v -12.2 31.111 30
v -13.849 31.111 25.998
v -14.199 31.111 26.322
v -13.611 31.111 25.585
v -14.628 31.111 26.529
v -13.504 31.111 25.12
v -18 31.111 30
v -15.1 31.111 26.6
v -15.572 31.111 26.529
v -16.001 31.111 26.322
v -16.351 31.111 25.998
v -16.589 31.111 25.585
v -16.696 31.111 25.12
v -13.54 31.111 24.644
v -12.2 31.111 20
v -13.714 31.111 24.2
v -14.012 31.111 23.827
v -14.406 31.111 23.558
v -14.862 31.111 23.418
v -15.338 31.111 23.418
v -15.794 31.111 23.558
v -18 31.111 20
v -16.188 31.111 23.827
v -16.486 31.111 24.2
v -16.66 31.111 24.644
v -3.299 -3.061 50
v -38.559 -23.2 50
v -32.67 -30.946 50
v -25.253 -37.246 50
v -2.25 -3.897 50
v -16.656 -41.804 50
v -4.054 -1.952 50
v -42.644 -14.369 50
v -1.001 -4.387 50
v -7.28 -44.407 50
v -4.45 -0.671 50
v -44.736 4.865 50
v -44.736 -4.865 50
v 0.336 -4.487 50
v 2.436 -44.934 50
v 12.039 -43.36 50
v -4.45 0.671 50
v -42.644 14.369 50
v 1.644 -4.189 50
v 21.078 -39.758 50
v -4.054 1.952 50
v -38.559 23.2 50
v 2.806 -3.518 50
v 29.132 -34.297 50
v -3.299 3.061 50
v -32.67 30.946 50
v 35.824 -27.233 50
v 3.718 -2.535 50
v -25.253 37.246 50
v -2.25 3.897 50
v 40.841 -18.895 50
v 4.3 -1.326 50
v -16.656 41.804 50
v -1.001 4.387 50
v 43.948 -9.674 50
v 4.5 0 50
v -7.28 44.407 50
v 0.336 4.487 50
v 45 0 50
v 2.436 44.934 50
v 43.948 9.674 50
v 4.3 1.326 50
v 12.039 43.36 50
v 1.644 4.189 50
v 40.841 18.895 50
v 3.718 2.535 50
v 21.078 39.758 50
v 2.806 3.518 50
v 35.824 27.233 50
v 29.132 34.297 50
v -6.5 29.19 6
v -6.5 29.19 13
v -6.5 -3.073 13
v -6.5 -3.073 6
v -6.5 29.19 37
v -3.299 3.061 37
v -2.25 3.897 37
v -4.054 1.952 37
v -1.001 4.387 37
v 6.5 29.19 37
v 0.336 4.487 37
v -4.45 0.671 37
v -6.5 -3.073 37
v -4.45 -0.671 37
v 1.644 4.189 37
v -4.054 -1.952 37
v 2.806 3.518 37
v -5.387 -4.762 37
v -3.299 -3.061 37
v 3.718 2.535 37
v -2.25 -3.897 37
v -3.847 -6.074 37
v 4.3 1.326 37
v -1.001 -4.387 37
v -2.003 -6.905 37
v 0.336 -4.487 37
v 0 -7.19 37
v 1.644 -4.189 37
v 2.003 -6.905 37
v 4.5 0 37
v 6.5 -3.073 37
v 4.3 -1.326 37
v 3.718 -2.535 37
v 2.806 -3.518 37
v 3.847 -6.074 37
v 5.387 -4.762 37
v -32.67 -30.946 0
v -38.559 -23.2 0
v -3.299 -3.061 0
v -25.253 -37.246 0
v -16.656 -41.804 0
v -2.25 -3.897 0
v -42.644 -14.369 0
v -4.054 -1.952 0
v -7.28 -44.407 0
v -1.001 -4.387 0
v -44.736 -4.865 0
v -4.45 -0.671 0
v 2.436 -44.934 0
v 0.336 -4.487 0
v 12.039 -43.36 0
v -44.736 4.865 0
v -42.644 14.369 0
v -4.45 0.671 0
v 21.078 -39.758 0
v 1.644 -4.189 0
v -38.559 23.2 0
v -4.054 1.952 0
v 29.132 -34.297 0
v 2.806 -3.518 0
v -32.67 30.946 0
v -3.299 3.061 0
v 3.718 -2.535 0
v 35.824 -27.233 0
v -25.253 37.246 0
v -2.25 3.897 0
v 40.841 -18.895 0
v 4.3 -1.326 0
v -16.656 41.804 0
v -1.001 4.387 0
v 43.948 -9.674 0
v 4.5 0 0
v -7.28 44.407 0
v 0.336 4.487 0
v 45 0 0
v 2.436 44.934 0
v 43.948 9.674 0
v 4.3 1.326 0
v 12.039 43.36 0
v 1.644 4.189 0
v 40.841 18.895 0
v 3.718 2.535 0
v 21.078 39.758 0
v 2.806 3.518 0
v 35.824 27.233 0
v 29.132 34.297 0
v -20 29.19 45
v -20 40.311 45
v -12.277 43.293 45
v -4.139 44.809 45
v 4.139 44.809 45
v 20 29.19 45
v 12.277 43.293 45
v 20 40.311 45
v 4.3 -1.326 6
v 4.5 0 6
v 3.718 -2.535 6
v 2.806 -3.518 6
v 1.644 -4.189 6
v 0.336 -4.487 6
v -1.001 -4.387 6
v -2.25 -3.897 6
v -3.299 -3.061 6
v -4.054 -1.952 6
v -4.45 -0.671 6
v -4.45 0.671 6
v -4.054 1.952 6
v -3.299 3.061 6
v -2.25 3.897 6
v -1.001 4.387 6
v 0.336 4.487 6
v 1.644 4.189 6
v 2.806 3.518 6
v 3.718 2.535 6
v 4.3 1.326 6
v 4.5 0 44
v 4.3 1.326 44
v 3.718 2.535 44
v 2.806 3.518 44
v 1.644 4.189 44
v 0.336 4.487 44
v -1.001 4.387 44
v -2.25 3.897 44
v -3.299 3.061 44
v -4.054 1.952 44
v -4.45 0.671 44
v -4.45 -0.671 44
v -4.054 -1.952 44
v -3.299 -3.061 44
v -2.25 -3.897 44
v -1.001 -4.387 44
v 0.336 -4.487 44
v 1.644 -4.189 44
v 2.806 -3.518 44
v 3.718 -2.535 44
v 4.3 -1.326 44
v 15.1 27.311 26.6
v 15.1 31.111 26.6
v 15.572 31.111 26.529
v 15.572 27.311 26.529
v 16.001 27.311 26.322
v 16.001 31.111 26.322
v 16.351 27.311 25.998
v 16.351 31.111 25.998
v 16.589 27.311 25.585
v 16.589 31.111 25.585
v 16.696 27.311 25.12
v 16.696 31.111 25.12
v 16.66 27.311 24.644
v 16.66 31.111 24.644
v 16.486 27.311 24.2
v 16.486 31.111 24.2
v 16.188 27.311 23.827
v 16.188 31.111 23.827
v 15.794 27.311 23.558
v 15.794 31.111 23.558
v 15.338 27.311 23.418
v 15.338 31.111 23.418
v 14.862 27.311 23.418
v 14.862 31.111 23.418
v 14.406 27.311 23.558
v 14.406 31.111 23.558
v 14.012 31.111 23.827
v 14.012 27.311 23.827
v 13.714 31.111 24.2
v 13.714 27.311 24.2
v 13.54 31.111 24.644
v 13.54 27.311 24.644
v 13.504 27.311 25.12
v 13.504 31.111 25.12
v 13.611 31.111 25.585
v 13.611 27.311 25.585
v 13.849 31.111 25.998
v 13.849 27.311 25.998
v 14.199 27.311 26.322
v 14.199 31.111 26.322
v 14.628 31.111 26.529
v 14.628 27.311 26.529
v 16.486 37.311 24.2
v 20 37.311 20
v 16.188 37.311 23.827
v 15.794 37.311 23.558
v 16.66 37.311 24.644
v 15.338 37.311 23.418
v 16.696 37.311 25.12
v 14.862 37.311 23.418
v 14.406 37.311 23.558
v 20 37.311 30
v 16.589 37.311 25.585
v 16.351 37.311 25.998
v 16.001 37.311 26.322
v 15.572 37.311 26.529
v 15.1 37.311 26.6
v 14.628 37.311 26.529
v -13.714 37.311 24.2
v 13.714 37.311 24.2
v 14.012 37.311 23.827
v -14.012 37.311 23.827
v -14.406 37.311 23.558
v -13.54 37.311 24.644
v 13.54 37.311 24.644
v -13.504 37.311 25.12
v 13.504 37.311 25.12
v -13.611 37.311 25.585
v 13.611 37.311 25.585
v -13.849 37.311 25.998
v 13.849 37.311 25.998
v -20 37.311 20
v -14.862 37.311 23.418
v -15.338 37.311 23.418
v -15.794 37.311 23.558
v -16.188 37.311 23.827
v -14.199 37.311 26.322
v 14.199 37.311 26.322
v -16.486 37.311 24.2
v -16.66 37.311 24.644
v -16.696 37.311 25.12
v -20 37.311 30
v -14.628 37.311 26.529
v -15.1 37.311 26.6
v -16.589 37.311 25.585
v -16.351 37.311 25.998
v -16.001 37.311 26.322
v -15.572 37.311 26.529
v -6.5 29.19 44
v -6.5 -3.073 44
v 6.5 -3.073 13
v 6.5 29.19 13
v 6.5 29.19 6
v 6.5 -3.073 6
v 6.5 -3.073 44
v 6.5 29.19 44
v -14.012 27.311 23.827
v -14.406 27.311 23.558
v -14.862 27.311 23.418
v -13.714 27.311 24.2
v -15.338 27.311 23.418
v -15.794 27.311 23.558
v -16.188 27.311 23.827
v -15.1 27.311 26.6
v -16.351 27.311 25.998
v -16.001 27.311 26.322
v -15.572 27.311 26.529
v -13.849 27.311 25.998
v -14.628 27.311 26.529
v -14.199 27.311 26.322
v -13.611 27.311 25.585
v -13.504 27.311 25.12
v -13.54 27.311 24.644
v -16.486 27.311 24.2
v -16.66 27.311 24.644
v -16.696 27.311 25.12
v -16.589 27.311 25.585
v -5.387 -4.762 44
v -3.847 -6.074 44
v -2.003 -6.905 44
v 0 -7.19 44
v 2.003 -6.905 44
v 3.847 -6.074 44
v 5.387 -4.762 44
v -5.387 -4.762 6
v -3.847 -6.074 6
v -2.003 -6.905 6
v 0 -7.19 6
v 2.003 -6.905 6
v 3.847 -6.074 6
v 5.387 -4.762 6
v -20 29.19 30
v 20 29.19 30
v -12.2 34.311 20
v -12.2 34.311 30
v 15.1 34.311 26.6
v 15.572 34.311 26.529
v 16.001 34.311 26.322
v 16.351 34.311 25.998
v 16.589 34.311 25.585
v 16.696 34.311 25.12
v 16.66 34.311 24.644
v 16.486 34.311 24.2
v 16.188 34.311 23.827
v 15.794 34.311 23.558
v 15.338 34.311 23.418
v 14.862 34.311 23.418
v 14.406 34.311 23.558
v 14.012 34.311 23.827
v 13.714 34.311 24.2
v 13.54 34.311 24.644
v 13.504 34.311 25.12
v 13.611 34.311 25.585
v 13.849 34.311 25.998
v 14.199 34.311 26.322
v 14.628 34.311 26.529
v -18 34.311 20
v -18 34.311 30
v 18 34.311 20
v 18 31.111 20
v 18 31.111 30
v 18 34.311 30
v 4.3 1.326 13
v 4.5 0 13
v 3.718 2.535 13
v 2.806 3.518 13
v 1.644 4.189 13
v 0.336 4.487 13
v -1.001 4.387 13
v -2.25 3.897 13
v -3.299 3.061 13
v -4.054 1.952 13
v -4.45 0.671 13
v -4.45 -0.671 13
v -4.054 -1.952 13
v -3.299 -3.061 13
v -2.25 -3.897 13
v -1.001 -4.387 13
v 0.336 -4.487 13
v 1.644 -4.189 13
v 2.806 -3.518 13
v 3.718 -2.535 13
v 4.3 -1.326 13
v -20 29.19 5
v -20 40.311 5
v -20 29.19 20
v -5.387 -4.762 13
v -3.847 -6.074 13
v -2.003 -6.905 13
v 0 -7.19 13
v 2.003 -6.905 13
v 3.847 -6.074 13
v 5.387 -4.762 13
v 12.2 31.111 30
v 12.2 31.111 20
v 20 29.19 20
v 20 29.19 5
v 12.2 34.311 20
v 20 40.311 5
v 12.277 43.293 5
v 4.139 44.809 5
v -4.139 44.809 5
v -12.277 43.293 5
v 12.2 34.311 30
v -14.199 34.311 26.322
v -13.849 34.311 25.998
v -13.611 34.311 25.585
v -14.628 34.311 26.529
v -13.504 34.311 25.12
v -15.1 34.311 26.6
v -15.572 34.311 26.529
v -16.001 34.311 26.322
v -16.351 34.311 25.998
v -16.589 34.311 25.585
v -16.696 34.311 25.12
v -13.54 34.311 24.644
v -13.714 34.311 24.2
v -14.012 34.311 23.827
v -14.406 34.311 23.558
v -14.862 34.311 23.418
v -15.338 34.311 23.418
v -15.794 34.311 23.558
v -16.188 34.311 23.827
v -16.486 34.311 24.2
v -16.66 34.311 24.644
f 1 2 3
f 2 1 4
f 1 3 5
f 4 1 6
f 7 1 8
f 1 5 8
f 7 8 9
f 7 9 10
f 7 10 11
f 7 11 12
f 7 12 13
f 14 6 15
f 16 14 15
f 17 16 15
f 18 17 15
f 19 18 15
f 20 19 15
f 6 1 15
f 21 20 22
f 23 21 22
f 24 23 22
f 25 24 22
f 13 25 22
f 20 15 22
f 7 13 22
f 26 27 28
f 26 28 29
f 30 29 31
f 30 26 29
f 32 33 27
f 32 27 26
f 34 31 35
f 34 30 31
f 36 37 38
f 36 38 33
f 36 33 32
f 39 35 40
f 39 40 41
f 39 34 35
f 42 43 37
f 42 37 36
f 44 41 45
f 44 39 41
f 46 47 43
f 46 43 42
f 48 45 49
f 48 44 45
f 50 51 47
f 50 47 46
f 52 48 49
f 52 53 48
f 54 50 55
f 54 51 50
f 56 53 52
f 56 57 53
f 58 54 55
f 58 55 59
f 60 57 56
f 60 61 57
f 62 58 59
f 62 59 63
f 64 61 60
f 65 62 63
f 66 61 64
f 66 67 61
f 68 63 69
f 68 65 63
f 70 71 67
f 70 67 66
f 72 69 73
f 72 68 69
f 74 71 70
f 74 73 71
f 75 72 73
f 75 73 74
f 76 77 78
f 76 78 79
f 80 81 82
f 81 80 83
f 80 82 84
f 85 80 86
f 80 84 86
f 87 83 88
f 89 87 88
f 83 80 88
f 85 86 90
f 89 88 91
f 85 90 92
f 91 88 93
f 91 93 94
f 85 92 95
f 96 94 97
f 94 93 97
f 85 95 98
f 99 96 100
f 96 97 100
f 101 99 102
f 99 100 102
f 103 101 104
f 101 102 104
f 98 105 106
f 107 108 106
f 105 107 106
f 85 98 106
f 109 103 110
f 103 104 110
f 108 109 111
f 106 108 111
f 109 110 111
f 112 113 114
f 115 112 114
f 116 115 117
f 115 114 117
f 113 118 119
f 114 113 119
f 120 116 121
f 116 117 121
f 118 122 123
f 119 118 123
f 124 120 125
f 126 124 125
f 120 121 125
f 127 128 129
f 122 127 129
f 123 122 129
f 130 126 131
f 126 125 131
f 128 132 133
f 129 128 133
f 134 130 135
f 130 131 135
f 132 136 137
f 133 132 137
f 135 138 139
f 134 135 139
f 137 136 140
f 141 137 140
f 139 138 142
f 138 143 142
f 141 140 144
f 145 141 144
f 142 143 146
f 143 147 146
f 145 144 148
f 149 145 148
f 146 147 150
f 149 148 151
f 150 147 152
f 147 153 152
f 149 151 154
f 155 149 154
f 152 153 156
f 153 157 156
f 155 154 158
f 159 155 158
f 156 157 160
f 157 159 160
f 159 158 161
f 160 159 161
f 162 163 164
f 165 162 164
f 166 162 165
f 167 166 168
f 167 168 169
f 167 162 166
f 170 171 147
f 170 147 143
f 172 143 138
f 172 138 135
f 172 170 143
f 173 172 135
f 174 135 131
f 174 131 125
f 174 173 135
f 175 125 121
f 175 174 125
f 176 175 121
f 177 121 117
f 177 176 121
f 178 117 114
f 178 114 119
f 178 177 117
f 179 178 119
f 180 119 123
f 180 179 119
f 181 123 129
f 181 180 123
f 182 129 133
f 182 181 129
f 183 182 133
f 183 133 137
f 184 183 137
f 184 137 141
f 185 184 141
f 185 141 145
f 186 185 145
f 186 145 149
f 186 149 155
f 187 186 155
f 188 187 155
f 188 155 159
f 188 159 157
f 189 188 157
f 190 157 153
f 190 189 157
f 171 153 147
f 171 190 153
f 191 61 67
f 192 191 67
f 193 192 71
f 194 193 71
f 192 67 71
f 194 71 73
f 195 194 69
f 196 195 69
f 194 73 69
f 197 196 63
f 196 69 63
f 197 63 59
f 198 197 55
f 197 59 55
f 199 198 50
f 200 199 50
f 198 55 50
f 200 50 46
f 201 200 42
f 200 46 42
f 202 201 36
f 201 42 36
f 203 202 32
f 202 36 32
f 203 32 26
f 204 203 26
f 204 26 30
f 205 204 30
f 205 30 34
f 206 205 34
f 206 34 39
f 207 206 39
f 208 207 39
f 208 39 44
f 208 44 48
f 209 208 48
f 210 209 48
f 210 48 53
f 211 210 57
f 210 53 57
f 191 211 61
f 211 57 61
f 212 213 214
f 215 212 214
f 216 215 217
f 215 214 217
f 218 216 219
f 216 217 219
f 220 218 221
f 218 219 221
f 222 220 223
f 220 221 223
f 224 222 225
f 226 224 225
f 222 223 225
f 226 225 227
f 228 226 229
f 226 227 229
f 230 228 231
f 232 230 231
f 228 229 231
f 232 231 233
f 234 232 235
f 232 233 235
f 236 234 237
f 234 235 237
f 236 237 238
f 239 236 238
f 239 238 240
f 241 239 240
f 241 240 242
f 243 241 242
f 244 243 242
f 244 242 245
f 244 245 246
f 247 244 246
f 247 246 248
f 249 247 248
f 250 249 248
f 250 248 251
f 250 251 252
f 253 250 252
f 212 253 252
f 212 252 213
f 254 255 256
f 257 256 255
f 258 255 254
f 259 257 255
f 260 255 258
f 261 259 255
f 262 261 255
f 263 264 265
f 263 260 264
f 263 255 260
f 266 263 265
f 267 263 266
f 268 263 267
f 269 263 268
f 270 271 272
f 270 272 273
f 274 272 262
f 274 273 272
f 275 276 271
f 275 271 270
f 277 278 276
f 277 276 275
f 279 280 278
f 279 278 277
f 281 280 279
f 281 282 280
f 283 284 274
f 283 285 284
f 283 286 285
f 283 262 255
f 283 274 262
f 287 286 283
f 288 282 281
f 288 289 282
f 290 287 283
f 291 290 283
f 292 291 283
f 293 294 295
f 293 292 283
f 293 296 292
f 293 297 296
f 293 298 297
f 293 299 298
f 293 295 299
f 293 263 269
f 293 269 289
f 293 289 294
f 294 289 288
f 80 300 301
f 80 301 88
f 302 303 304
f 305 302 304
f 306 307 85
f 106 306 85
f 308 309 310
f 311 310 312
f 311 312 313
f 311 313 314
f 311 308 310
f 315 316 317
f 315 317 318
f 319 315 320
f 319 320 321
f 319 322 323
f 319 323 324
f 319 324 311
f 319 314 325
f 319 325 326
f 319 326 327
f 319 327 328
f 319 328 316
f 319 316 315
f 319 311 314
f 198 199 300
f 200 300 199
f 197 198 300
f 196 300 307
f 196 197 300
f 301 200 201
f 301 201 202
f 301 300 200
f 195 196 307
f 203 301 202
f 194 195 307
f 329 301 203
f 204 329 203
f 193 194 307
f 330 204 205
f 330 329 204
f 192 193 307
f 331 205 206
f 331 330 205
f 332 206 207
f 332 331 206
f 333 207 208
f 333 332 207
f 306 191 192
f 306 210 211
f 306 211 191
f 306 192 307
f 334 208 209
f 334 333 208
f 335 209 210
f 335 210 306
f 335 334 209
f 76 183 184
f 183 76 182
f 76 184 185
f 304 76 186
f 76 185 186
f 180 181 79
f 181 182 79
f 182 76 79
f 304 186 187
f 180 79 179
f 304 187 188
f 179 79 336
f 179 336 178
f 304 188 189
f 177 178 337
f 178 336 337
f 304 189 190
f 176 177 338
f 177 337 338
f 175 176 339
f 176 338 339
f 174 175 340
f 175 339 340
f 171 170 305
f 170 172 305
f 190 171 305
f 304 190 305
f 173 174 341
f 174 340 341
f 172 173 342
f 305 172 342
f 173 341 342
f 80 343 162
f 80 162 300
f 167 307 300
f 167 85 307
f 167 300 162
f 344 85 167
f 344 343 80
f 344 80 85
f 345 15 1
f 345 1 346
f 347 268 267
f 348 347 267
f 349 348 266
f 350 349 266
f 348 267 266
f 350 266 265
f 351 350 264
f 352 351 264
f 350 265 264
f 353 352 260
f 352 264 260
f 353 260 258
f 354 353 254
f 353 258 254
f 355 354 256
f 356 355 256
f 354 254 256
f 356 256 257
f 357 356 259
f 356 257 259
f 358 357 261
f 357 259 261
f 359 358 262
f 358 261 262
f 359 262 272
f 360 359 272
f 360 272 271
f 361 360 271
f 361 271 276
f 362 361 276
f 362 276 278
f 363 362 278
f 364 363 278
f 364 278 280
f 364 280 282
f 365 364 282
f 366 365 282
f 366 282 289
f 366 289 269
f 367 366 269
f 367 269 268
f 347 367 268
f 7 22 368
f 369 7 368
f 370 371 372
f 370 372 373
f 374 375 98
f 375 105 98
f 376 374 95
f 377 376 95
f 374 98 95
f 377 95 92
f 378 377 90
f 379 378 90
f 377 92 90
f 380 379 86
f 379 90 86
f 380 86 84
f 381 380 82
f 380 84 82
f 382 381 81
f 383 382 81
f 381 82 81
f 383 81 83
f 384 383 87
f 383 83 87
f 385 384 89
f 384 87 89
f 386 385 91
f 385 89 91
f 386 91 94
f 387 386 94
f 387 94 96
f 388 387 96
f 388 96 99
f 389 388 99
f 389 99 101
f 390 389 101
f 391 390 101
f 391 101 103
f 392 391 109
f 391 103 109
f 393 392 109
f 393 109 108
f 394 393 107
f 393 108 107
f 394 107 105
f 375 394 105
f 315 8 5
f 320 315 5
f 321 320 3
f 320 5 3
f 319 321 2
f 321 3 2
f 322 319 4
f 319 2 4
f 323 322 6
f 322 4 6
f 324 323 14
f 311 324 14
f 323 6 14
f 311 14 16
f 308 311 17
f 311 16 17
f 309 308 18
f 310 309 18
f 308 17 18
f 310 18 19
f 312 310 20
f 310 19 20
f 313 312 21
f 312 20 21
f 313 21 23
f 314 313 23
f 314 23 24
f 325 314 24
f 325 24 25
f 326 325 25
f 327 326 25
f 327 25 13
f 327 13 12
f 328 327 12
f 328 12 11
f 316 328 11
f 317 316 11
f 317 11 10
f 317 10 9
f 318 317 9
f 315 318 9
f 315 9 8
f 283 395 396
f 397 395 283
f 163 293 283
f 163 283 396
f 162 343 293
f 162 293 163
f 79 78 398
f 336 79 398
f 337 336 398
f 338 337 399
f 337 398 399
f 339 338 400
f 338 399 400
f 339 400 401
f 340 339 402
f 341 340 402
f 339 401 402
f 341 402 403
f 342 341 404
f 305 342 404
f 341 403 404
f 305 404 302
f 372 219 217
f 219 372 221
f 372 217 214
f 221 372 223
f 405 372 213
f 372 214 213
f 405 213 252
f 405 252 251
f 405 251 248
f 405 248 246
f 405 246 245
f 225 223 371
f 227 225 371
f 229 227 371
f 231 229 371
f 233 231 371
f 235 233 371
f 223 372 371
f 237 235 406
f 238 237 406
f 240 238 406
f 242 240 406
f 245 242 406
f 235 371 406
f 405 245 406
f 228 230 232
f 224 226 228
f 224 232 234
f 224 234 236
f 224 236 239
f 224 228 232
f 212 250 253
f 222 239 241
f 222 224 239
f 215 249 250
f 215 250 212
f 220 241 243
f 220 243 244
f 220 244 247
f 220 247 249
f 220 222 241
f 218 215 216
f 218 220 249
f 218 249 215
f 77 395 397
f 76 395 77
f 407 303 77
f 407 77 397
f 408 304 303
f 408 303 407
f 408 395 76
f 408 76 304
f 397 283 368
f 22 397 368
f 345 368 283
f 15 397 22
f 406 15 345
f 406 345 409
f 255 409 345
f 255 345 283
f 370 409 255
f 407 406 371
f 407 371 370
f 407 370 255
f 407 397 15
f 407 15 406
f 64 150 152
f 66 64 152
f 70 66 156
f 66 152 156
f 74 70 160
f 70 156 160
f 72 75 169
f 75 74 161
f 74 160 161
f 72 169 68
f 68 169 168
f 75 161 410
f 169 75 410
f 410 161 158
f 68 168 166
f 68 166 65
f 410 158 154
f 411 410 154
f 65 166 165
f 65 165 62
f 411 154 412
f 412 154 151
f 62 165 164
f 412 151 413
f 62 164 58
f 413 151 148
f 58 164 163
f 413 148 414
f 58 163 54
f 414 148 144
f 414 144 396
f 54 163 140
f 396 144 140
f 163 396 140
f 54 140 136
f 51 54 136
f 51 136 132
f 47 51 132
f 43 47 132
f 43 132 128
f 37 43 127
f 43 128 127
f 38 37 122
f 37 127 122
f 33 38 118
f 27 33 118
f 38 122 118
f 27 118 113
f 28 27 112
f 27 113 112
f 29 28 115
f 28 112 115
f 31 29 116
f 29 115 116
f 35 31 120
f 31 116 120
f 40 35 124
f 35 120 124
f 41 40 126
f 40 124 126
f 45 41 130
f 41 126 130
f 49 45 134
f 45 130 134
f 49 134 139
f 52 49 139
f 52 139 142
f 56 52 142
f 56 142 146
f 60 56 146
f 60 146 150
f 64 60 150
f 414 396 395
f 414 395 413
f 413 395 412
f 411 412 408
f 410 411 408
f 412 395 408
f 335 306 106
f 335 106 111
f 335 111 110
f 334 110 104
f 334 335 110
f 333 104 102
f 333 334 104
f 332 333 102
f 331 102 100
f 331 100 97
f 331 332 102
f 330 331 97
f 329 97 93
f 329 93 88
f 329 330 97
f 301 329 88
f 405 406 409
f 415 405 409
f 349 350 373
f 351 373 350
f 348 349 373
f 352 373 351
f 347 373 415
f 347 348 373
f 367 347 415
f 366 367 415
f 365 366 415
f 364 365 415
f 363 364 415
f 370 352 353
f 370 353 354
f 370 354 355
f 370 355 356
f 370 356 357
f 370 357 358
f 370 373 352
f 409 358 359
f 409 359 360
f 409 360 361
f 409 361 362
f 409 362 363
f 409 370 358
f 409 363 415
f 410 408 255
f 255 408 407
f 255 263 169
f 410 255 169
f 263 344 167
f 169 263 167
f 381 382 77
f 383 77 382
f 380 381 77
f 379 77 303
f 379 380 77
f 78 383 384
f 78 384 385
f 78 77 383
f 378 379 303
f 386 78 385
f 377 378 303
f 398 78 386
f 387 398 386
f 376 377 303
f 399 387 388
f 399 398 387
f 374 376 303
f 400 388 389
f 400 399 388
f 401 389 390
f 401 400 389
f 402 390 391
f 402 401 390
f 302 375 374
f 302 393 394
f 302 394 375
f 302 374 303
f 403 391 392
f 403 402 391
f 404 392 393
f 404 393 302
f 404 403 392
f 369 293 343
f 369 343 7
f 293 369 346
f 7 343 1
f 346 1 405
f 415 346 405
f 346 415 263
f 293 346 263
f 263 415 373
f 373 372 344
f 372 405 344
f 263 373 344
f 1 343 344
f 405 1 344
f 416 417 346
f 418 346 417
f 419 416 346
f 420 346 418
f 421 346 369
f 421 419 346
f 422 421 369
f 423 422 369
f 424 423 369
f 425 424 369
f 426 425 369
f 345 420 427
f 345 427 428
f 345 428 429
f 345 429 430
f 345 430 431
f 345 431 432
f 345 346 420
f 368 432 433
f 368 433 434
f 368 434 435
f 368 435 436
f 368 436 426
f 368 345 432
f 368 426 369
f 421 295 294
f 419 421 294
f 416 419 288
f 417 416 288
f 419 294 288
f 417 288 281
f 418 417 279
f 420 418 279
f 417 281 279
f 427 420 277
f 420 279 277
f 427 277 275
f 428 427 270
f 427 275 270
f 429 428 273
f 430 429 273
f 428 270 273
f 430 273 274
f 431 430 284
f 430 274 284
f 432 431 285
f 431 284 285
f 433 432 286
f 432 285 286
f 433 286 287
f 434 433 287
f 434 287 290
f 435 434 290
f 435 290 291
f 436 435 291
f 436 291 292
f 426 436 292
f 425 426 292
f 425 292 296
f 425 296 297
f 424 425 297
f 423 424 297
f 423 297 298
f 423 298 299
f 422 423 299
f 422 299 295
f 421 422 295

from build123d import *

# Parameters (mm, degrees)
ESBO_O1_R                = 45
RESSALTO_EXTRUS_O1_DEPTH = 50
ESBO_O2_R                = 4.5
CORTE_EXTRUS_O2_DEPTH    = 6
CORTE_EXTRUS_O3_DEPTH    = 7
ESBO_O4_W                = 40
ESBO_O4_H                = 15
CORTE_EXTRUS_O4_DEPTH    = 41
CORTE_EXTRUS_O5_START    = -6
ESBO_O5_R                = 4.5
CORTE_EXTRUS_O5_DEPTH    = 6
CORTE_EXTRUS_O6_START    = -7
CORTE_EXTRUS_O6_DEPTH    = 7
ESBO_O7_W                = 40
ESBO_O7_H                = 15
CORTE_EXTRUS_O7_DEPTH    = 47
CORTE_EXTRUS_O8_REACH    = 72.356
CORTE_EXTRUS_O9_REACH    = 72.356
ESBO_O9_W                = 5.8
ESBO_O9_H                = 3.2
ESBO_O11_W               = 40
ESBO_O11_H               = 15
ESBO_O11_W_2             = 13
ESBO_O11_H_2             = 7
RESSALTO_EXTRUS_O2_DEPTH = 22
ESBO_O12_R               = 1.6
CORTE_EXTRUS_O10_DEPTH   = 10
CORTE_EXTRUS_O11_REACH   = 75.614
ESBO_O13_R               = 4.5


with BuildPart() as part:
    # Esboço1 → Ressalto-extrusão1 (new body)
    with BuildSketch(Plane.XY):
        Circle(ESBO_O1_R)
    extrude(amount=RESSALTO_EXTRUS_O1_DEPTH)

    # Esboço2 → Corte-extrusão2 (cut)
    with BuildSketch(Plane.XY.offset(50)):
        Circle(ESBO_O2_R)
    extrude(amount=-CORTE_EXTRUS_O2_DEPTH, mode=Mode.SUBTRACT)

    # Esboço3 → Corte-extrusão3 (cut)
    with BuildSketch(Plane.XY.offset(44)):
        with BuildLine():
            Line((-6.5, -3.073450829), (-6.5, 7.19))
            Line((-6.5, 7.19), (6.5, 7.19))
            Line((6.5, 7.19), (6.5, -3.073450829))
            ThreePointArc((6.5, -3.073450829), (0, -7.19), (-6.5, -3.073450829))
        make_face()
    extrude(amount=-CORTE_EXTRUS_O3_DEPTH, mode=Mode.SUBTRACT)

    # Esboço4 → Corte-extrusão4 (cut)
    with BuildSketch(Plane.XZ.offset(-7.19)):
        with Locations((0, 37.5)):
            Rectangle(ESBO_O4_W, ESBO_O4_H)
    extrude(amount=-CORTE_EXTRUS_O4_DEPTH, mode=Mode.SUBTRACT)

    # Esboço5 → Corte-extrusão5 (cut)
    with BuildSketch(Plane(origin=(0, 0, 0), x_dir=(-1, 0, 0), z_dir=(0, 0, -1)).offset(CORTE_EXTRUS_O5_START)):
        with Locations(Location((0, 0, 0), (0, 0, 180))):
            Circle(ESBO_O5_R)
    extrude(amount=CORTE_EXTRUS_O5_DEPTH, mode=Mode.SUBTRACT)

    # Esboço6 → Corte-extrusão6 (cut)
    with BuildSketch(Plane(origin=(0, 0, 6), x_dir=(-1, 0, 0), z_dir=(0, 0, -1)).offset(CORTE_EXTRUS_O6_START)):
        with BuildLine():
            Line((-6.5, -3.073450829), (-6.5, 7.19))
            Line((-6.5, 7.19), (6.5, 7.19))
            Line((6.5, 7.19), (6.5, -3.073450829))
            ThreePointArc((6.5, -3.073450829), (0, -7.19), (-6.5, -3.073450829))
        make_face()
    extrude(amount=CORTE_EXTRUS_O6_DEPTH, mode=Mode.SUBTRACT)

    # Esboço7 → Corte-extrusão7 (cut)
    with BuildSketch(Plane.XZ.offset(-7.19)):
        with Locations((0, 12.5)):
            Rectangle(ESBO_O7_W, ESBO_O7_H)
    extrude(amount=-CORTE_EXTRUS_O7_DEPTH, mode=Mode.SUBTRACT)

    # Esboço8 → Corte-extrusão8 (cut, up to next)
    with BuildSketch(Plane.XY.offset(30), mode=Mode.PRIVATE) as corte_extrus_o8_sk1:
        Polygon((-20, 40.311288741), (-20, 47.3700993), (20, 47.3700993), (20, 40.311288741), (20, 37.311288741), (-20, 37.311288741), align=None)
    corte_extrus_o8_tool1 = extrude(corte_extrus_o8_sk1.sketch, amount=-CORTE_EXTRUS_O8_REACH, mode=Mode.PRIVATE) & part.part
    add(corte_extrus_o8_tool1.solids().sort_by_distance((0, 42.340694, 30))[0], mode=Mode.SUBTRACT)

    # Esboço9 → Corte-extrusão9 (cut, up to next)
    with BuildSketch(Plane(origin=(0, 0, 20), x_dir=(-1, 0, 0), z_dir=(0, 0, -1)), mode=Mode.PRIVATE) as corte_extrus_o9_sk1:
        with Locations((-15.1, 32.711288741)):
            Rectangle(ESBO_O9_W, ESBO_O9_H)
    corte_extrus_o9_tool1 = extrude(corte_extrus_o9_sk1.sketch, amount=-CORTE_EXTRUS_O9_REACH, mode=Mode.PRIVATE) & part.part
    # Esboço9 → Corte-extrusão9 (cut, up to next)
    with BuildSketch(Plane(origin=(0, 0, 20), x_dir=(-1, 0, 0), z_dir=(0, 0, -1)), mode=Mode.PRIVATE) as corte_extrus_o9_sk2:
        with Locations((15.1, 32.711288741)):
            Rectangle(ESBO_O9_W, ESBO_O9_H)
    corte_extrus_o9_tool2 = extrude(corte_extrus_o9_sk2.sketch, amount=-CORTE_EXTRUS_O9_REACH, mode=Mode.PRIVATE) & part.part
    add(corte_extrus_o9_tool1.solids().sort_by_distance((15.1, 32.711289, 20))[0], mode=Mode.SUBTRACT)
    add(corte_extrus_o9_tool2.solids().sort_by_distance((-15.1, 32.711289, 20))[0], mode=Mode.SUBTRACT)

    # Esboço11 → Ressalto-extrusão2 (add)
    # profile 1 of 2: a face of its own
    with BuildSketch(Plane(origin=(0, 7.19, 0), x_dir=(1, 0, 0), z_dir=(0, 1, 0))):
        with Locations((0, -12.5)):
            Rectangle(ESBO_O11_W, ESBO_O11_H)
        with Locations((0, -9.5)):
            Rectangle(ESBO_O11_W_2, ESBO_O11_H_2, mode=Mode.SUBTRACT)
    # profile 2 of 2: a face of its own
    with BuildSketch(Plane(origin=(0, 7.19, 0), x_dir=(1, 0, 0), z_dir=(0, 1, 0))):
        with Locations((0, -37.5)):
            Rectangle(ESBO_O11_W, ESBO_O11_H)
        with Locations((0, -40.5)):
            Rectangle(ESBO_O11_W_2, ESBO_O11_H_2, mode=Mode.SUBTRACT)
    extrude(amount=RESSALTO_EXTRUS_O2_DEPTH)

    # Esboço12 → Corte-extrusão10 (cut)
    with BuildSketch(Plane(origin=(0, 37.311288741, 0), x_dir=(1, 0, 0), z_dir=(0, 1, 0))):
        with Locations(Location((-15.1, -25, 0), (0, 0, 270))):
            Circle(ESBO_O12_R)
        with Locations(Location((15.1, -25, 0), (0, 0, 270))):
            Circle(ESBO_O12_R)
    extrude(amount=-CORTE_EXTRUS_O10_DEPTH, mode=Mode.SUBTRACT)

    # Esboço13 → Corte-extrusão11 (cut, up to next)
    with BuildSketch(Plane.XY.offset(37), mode=Mode.PRIVATE) as corte_extrus_o11_sk1:
        Circle(ESBO_O13_R)
    corte_extrus_o11_tool1 = extrude(corte_extrus_o11_sk1.sketch, amount=-CORTE_EXTRUS_O11_REACH, mode=Mode.PRIVATE) & part.part
    add(corte_extrus_o11_tool1.solids().sort_by_distance((0, 0, 37))[0], mode=Mode.SUBTRACT)


solid = part.part
